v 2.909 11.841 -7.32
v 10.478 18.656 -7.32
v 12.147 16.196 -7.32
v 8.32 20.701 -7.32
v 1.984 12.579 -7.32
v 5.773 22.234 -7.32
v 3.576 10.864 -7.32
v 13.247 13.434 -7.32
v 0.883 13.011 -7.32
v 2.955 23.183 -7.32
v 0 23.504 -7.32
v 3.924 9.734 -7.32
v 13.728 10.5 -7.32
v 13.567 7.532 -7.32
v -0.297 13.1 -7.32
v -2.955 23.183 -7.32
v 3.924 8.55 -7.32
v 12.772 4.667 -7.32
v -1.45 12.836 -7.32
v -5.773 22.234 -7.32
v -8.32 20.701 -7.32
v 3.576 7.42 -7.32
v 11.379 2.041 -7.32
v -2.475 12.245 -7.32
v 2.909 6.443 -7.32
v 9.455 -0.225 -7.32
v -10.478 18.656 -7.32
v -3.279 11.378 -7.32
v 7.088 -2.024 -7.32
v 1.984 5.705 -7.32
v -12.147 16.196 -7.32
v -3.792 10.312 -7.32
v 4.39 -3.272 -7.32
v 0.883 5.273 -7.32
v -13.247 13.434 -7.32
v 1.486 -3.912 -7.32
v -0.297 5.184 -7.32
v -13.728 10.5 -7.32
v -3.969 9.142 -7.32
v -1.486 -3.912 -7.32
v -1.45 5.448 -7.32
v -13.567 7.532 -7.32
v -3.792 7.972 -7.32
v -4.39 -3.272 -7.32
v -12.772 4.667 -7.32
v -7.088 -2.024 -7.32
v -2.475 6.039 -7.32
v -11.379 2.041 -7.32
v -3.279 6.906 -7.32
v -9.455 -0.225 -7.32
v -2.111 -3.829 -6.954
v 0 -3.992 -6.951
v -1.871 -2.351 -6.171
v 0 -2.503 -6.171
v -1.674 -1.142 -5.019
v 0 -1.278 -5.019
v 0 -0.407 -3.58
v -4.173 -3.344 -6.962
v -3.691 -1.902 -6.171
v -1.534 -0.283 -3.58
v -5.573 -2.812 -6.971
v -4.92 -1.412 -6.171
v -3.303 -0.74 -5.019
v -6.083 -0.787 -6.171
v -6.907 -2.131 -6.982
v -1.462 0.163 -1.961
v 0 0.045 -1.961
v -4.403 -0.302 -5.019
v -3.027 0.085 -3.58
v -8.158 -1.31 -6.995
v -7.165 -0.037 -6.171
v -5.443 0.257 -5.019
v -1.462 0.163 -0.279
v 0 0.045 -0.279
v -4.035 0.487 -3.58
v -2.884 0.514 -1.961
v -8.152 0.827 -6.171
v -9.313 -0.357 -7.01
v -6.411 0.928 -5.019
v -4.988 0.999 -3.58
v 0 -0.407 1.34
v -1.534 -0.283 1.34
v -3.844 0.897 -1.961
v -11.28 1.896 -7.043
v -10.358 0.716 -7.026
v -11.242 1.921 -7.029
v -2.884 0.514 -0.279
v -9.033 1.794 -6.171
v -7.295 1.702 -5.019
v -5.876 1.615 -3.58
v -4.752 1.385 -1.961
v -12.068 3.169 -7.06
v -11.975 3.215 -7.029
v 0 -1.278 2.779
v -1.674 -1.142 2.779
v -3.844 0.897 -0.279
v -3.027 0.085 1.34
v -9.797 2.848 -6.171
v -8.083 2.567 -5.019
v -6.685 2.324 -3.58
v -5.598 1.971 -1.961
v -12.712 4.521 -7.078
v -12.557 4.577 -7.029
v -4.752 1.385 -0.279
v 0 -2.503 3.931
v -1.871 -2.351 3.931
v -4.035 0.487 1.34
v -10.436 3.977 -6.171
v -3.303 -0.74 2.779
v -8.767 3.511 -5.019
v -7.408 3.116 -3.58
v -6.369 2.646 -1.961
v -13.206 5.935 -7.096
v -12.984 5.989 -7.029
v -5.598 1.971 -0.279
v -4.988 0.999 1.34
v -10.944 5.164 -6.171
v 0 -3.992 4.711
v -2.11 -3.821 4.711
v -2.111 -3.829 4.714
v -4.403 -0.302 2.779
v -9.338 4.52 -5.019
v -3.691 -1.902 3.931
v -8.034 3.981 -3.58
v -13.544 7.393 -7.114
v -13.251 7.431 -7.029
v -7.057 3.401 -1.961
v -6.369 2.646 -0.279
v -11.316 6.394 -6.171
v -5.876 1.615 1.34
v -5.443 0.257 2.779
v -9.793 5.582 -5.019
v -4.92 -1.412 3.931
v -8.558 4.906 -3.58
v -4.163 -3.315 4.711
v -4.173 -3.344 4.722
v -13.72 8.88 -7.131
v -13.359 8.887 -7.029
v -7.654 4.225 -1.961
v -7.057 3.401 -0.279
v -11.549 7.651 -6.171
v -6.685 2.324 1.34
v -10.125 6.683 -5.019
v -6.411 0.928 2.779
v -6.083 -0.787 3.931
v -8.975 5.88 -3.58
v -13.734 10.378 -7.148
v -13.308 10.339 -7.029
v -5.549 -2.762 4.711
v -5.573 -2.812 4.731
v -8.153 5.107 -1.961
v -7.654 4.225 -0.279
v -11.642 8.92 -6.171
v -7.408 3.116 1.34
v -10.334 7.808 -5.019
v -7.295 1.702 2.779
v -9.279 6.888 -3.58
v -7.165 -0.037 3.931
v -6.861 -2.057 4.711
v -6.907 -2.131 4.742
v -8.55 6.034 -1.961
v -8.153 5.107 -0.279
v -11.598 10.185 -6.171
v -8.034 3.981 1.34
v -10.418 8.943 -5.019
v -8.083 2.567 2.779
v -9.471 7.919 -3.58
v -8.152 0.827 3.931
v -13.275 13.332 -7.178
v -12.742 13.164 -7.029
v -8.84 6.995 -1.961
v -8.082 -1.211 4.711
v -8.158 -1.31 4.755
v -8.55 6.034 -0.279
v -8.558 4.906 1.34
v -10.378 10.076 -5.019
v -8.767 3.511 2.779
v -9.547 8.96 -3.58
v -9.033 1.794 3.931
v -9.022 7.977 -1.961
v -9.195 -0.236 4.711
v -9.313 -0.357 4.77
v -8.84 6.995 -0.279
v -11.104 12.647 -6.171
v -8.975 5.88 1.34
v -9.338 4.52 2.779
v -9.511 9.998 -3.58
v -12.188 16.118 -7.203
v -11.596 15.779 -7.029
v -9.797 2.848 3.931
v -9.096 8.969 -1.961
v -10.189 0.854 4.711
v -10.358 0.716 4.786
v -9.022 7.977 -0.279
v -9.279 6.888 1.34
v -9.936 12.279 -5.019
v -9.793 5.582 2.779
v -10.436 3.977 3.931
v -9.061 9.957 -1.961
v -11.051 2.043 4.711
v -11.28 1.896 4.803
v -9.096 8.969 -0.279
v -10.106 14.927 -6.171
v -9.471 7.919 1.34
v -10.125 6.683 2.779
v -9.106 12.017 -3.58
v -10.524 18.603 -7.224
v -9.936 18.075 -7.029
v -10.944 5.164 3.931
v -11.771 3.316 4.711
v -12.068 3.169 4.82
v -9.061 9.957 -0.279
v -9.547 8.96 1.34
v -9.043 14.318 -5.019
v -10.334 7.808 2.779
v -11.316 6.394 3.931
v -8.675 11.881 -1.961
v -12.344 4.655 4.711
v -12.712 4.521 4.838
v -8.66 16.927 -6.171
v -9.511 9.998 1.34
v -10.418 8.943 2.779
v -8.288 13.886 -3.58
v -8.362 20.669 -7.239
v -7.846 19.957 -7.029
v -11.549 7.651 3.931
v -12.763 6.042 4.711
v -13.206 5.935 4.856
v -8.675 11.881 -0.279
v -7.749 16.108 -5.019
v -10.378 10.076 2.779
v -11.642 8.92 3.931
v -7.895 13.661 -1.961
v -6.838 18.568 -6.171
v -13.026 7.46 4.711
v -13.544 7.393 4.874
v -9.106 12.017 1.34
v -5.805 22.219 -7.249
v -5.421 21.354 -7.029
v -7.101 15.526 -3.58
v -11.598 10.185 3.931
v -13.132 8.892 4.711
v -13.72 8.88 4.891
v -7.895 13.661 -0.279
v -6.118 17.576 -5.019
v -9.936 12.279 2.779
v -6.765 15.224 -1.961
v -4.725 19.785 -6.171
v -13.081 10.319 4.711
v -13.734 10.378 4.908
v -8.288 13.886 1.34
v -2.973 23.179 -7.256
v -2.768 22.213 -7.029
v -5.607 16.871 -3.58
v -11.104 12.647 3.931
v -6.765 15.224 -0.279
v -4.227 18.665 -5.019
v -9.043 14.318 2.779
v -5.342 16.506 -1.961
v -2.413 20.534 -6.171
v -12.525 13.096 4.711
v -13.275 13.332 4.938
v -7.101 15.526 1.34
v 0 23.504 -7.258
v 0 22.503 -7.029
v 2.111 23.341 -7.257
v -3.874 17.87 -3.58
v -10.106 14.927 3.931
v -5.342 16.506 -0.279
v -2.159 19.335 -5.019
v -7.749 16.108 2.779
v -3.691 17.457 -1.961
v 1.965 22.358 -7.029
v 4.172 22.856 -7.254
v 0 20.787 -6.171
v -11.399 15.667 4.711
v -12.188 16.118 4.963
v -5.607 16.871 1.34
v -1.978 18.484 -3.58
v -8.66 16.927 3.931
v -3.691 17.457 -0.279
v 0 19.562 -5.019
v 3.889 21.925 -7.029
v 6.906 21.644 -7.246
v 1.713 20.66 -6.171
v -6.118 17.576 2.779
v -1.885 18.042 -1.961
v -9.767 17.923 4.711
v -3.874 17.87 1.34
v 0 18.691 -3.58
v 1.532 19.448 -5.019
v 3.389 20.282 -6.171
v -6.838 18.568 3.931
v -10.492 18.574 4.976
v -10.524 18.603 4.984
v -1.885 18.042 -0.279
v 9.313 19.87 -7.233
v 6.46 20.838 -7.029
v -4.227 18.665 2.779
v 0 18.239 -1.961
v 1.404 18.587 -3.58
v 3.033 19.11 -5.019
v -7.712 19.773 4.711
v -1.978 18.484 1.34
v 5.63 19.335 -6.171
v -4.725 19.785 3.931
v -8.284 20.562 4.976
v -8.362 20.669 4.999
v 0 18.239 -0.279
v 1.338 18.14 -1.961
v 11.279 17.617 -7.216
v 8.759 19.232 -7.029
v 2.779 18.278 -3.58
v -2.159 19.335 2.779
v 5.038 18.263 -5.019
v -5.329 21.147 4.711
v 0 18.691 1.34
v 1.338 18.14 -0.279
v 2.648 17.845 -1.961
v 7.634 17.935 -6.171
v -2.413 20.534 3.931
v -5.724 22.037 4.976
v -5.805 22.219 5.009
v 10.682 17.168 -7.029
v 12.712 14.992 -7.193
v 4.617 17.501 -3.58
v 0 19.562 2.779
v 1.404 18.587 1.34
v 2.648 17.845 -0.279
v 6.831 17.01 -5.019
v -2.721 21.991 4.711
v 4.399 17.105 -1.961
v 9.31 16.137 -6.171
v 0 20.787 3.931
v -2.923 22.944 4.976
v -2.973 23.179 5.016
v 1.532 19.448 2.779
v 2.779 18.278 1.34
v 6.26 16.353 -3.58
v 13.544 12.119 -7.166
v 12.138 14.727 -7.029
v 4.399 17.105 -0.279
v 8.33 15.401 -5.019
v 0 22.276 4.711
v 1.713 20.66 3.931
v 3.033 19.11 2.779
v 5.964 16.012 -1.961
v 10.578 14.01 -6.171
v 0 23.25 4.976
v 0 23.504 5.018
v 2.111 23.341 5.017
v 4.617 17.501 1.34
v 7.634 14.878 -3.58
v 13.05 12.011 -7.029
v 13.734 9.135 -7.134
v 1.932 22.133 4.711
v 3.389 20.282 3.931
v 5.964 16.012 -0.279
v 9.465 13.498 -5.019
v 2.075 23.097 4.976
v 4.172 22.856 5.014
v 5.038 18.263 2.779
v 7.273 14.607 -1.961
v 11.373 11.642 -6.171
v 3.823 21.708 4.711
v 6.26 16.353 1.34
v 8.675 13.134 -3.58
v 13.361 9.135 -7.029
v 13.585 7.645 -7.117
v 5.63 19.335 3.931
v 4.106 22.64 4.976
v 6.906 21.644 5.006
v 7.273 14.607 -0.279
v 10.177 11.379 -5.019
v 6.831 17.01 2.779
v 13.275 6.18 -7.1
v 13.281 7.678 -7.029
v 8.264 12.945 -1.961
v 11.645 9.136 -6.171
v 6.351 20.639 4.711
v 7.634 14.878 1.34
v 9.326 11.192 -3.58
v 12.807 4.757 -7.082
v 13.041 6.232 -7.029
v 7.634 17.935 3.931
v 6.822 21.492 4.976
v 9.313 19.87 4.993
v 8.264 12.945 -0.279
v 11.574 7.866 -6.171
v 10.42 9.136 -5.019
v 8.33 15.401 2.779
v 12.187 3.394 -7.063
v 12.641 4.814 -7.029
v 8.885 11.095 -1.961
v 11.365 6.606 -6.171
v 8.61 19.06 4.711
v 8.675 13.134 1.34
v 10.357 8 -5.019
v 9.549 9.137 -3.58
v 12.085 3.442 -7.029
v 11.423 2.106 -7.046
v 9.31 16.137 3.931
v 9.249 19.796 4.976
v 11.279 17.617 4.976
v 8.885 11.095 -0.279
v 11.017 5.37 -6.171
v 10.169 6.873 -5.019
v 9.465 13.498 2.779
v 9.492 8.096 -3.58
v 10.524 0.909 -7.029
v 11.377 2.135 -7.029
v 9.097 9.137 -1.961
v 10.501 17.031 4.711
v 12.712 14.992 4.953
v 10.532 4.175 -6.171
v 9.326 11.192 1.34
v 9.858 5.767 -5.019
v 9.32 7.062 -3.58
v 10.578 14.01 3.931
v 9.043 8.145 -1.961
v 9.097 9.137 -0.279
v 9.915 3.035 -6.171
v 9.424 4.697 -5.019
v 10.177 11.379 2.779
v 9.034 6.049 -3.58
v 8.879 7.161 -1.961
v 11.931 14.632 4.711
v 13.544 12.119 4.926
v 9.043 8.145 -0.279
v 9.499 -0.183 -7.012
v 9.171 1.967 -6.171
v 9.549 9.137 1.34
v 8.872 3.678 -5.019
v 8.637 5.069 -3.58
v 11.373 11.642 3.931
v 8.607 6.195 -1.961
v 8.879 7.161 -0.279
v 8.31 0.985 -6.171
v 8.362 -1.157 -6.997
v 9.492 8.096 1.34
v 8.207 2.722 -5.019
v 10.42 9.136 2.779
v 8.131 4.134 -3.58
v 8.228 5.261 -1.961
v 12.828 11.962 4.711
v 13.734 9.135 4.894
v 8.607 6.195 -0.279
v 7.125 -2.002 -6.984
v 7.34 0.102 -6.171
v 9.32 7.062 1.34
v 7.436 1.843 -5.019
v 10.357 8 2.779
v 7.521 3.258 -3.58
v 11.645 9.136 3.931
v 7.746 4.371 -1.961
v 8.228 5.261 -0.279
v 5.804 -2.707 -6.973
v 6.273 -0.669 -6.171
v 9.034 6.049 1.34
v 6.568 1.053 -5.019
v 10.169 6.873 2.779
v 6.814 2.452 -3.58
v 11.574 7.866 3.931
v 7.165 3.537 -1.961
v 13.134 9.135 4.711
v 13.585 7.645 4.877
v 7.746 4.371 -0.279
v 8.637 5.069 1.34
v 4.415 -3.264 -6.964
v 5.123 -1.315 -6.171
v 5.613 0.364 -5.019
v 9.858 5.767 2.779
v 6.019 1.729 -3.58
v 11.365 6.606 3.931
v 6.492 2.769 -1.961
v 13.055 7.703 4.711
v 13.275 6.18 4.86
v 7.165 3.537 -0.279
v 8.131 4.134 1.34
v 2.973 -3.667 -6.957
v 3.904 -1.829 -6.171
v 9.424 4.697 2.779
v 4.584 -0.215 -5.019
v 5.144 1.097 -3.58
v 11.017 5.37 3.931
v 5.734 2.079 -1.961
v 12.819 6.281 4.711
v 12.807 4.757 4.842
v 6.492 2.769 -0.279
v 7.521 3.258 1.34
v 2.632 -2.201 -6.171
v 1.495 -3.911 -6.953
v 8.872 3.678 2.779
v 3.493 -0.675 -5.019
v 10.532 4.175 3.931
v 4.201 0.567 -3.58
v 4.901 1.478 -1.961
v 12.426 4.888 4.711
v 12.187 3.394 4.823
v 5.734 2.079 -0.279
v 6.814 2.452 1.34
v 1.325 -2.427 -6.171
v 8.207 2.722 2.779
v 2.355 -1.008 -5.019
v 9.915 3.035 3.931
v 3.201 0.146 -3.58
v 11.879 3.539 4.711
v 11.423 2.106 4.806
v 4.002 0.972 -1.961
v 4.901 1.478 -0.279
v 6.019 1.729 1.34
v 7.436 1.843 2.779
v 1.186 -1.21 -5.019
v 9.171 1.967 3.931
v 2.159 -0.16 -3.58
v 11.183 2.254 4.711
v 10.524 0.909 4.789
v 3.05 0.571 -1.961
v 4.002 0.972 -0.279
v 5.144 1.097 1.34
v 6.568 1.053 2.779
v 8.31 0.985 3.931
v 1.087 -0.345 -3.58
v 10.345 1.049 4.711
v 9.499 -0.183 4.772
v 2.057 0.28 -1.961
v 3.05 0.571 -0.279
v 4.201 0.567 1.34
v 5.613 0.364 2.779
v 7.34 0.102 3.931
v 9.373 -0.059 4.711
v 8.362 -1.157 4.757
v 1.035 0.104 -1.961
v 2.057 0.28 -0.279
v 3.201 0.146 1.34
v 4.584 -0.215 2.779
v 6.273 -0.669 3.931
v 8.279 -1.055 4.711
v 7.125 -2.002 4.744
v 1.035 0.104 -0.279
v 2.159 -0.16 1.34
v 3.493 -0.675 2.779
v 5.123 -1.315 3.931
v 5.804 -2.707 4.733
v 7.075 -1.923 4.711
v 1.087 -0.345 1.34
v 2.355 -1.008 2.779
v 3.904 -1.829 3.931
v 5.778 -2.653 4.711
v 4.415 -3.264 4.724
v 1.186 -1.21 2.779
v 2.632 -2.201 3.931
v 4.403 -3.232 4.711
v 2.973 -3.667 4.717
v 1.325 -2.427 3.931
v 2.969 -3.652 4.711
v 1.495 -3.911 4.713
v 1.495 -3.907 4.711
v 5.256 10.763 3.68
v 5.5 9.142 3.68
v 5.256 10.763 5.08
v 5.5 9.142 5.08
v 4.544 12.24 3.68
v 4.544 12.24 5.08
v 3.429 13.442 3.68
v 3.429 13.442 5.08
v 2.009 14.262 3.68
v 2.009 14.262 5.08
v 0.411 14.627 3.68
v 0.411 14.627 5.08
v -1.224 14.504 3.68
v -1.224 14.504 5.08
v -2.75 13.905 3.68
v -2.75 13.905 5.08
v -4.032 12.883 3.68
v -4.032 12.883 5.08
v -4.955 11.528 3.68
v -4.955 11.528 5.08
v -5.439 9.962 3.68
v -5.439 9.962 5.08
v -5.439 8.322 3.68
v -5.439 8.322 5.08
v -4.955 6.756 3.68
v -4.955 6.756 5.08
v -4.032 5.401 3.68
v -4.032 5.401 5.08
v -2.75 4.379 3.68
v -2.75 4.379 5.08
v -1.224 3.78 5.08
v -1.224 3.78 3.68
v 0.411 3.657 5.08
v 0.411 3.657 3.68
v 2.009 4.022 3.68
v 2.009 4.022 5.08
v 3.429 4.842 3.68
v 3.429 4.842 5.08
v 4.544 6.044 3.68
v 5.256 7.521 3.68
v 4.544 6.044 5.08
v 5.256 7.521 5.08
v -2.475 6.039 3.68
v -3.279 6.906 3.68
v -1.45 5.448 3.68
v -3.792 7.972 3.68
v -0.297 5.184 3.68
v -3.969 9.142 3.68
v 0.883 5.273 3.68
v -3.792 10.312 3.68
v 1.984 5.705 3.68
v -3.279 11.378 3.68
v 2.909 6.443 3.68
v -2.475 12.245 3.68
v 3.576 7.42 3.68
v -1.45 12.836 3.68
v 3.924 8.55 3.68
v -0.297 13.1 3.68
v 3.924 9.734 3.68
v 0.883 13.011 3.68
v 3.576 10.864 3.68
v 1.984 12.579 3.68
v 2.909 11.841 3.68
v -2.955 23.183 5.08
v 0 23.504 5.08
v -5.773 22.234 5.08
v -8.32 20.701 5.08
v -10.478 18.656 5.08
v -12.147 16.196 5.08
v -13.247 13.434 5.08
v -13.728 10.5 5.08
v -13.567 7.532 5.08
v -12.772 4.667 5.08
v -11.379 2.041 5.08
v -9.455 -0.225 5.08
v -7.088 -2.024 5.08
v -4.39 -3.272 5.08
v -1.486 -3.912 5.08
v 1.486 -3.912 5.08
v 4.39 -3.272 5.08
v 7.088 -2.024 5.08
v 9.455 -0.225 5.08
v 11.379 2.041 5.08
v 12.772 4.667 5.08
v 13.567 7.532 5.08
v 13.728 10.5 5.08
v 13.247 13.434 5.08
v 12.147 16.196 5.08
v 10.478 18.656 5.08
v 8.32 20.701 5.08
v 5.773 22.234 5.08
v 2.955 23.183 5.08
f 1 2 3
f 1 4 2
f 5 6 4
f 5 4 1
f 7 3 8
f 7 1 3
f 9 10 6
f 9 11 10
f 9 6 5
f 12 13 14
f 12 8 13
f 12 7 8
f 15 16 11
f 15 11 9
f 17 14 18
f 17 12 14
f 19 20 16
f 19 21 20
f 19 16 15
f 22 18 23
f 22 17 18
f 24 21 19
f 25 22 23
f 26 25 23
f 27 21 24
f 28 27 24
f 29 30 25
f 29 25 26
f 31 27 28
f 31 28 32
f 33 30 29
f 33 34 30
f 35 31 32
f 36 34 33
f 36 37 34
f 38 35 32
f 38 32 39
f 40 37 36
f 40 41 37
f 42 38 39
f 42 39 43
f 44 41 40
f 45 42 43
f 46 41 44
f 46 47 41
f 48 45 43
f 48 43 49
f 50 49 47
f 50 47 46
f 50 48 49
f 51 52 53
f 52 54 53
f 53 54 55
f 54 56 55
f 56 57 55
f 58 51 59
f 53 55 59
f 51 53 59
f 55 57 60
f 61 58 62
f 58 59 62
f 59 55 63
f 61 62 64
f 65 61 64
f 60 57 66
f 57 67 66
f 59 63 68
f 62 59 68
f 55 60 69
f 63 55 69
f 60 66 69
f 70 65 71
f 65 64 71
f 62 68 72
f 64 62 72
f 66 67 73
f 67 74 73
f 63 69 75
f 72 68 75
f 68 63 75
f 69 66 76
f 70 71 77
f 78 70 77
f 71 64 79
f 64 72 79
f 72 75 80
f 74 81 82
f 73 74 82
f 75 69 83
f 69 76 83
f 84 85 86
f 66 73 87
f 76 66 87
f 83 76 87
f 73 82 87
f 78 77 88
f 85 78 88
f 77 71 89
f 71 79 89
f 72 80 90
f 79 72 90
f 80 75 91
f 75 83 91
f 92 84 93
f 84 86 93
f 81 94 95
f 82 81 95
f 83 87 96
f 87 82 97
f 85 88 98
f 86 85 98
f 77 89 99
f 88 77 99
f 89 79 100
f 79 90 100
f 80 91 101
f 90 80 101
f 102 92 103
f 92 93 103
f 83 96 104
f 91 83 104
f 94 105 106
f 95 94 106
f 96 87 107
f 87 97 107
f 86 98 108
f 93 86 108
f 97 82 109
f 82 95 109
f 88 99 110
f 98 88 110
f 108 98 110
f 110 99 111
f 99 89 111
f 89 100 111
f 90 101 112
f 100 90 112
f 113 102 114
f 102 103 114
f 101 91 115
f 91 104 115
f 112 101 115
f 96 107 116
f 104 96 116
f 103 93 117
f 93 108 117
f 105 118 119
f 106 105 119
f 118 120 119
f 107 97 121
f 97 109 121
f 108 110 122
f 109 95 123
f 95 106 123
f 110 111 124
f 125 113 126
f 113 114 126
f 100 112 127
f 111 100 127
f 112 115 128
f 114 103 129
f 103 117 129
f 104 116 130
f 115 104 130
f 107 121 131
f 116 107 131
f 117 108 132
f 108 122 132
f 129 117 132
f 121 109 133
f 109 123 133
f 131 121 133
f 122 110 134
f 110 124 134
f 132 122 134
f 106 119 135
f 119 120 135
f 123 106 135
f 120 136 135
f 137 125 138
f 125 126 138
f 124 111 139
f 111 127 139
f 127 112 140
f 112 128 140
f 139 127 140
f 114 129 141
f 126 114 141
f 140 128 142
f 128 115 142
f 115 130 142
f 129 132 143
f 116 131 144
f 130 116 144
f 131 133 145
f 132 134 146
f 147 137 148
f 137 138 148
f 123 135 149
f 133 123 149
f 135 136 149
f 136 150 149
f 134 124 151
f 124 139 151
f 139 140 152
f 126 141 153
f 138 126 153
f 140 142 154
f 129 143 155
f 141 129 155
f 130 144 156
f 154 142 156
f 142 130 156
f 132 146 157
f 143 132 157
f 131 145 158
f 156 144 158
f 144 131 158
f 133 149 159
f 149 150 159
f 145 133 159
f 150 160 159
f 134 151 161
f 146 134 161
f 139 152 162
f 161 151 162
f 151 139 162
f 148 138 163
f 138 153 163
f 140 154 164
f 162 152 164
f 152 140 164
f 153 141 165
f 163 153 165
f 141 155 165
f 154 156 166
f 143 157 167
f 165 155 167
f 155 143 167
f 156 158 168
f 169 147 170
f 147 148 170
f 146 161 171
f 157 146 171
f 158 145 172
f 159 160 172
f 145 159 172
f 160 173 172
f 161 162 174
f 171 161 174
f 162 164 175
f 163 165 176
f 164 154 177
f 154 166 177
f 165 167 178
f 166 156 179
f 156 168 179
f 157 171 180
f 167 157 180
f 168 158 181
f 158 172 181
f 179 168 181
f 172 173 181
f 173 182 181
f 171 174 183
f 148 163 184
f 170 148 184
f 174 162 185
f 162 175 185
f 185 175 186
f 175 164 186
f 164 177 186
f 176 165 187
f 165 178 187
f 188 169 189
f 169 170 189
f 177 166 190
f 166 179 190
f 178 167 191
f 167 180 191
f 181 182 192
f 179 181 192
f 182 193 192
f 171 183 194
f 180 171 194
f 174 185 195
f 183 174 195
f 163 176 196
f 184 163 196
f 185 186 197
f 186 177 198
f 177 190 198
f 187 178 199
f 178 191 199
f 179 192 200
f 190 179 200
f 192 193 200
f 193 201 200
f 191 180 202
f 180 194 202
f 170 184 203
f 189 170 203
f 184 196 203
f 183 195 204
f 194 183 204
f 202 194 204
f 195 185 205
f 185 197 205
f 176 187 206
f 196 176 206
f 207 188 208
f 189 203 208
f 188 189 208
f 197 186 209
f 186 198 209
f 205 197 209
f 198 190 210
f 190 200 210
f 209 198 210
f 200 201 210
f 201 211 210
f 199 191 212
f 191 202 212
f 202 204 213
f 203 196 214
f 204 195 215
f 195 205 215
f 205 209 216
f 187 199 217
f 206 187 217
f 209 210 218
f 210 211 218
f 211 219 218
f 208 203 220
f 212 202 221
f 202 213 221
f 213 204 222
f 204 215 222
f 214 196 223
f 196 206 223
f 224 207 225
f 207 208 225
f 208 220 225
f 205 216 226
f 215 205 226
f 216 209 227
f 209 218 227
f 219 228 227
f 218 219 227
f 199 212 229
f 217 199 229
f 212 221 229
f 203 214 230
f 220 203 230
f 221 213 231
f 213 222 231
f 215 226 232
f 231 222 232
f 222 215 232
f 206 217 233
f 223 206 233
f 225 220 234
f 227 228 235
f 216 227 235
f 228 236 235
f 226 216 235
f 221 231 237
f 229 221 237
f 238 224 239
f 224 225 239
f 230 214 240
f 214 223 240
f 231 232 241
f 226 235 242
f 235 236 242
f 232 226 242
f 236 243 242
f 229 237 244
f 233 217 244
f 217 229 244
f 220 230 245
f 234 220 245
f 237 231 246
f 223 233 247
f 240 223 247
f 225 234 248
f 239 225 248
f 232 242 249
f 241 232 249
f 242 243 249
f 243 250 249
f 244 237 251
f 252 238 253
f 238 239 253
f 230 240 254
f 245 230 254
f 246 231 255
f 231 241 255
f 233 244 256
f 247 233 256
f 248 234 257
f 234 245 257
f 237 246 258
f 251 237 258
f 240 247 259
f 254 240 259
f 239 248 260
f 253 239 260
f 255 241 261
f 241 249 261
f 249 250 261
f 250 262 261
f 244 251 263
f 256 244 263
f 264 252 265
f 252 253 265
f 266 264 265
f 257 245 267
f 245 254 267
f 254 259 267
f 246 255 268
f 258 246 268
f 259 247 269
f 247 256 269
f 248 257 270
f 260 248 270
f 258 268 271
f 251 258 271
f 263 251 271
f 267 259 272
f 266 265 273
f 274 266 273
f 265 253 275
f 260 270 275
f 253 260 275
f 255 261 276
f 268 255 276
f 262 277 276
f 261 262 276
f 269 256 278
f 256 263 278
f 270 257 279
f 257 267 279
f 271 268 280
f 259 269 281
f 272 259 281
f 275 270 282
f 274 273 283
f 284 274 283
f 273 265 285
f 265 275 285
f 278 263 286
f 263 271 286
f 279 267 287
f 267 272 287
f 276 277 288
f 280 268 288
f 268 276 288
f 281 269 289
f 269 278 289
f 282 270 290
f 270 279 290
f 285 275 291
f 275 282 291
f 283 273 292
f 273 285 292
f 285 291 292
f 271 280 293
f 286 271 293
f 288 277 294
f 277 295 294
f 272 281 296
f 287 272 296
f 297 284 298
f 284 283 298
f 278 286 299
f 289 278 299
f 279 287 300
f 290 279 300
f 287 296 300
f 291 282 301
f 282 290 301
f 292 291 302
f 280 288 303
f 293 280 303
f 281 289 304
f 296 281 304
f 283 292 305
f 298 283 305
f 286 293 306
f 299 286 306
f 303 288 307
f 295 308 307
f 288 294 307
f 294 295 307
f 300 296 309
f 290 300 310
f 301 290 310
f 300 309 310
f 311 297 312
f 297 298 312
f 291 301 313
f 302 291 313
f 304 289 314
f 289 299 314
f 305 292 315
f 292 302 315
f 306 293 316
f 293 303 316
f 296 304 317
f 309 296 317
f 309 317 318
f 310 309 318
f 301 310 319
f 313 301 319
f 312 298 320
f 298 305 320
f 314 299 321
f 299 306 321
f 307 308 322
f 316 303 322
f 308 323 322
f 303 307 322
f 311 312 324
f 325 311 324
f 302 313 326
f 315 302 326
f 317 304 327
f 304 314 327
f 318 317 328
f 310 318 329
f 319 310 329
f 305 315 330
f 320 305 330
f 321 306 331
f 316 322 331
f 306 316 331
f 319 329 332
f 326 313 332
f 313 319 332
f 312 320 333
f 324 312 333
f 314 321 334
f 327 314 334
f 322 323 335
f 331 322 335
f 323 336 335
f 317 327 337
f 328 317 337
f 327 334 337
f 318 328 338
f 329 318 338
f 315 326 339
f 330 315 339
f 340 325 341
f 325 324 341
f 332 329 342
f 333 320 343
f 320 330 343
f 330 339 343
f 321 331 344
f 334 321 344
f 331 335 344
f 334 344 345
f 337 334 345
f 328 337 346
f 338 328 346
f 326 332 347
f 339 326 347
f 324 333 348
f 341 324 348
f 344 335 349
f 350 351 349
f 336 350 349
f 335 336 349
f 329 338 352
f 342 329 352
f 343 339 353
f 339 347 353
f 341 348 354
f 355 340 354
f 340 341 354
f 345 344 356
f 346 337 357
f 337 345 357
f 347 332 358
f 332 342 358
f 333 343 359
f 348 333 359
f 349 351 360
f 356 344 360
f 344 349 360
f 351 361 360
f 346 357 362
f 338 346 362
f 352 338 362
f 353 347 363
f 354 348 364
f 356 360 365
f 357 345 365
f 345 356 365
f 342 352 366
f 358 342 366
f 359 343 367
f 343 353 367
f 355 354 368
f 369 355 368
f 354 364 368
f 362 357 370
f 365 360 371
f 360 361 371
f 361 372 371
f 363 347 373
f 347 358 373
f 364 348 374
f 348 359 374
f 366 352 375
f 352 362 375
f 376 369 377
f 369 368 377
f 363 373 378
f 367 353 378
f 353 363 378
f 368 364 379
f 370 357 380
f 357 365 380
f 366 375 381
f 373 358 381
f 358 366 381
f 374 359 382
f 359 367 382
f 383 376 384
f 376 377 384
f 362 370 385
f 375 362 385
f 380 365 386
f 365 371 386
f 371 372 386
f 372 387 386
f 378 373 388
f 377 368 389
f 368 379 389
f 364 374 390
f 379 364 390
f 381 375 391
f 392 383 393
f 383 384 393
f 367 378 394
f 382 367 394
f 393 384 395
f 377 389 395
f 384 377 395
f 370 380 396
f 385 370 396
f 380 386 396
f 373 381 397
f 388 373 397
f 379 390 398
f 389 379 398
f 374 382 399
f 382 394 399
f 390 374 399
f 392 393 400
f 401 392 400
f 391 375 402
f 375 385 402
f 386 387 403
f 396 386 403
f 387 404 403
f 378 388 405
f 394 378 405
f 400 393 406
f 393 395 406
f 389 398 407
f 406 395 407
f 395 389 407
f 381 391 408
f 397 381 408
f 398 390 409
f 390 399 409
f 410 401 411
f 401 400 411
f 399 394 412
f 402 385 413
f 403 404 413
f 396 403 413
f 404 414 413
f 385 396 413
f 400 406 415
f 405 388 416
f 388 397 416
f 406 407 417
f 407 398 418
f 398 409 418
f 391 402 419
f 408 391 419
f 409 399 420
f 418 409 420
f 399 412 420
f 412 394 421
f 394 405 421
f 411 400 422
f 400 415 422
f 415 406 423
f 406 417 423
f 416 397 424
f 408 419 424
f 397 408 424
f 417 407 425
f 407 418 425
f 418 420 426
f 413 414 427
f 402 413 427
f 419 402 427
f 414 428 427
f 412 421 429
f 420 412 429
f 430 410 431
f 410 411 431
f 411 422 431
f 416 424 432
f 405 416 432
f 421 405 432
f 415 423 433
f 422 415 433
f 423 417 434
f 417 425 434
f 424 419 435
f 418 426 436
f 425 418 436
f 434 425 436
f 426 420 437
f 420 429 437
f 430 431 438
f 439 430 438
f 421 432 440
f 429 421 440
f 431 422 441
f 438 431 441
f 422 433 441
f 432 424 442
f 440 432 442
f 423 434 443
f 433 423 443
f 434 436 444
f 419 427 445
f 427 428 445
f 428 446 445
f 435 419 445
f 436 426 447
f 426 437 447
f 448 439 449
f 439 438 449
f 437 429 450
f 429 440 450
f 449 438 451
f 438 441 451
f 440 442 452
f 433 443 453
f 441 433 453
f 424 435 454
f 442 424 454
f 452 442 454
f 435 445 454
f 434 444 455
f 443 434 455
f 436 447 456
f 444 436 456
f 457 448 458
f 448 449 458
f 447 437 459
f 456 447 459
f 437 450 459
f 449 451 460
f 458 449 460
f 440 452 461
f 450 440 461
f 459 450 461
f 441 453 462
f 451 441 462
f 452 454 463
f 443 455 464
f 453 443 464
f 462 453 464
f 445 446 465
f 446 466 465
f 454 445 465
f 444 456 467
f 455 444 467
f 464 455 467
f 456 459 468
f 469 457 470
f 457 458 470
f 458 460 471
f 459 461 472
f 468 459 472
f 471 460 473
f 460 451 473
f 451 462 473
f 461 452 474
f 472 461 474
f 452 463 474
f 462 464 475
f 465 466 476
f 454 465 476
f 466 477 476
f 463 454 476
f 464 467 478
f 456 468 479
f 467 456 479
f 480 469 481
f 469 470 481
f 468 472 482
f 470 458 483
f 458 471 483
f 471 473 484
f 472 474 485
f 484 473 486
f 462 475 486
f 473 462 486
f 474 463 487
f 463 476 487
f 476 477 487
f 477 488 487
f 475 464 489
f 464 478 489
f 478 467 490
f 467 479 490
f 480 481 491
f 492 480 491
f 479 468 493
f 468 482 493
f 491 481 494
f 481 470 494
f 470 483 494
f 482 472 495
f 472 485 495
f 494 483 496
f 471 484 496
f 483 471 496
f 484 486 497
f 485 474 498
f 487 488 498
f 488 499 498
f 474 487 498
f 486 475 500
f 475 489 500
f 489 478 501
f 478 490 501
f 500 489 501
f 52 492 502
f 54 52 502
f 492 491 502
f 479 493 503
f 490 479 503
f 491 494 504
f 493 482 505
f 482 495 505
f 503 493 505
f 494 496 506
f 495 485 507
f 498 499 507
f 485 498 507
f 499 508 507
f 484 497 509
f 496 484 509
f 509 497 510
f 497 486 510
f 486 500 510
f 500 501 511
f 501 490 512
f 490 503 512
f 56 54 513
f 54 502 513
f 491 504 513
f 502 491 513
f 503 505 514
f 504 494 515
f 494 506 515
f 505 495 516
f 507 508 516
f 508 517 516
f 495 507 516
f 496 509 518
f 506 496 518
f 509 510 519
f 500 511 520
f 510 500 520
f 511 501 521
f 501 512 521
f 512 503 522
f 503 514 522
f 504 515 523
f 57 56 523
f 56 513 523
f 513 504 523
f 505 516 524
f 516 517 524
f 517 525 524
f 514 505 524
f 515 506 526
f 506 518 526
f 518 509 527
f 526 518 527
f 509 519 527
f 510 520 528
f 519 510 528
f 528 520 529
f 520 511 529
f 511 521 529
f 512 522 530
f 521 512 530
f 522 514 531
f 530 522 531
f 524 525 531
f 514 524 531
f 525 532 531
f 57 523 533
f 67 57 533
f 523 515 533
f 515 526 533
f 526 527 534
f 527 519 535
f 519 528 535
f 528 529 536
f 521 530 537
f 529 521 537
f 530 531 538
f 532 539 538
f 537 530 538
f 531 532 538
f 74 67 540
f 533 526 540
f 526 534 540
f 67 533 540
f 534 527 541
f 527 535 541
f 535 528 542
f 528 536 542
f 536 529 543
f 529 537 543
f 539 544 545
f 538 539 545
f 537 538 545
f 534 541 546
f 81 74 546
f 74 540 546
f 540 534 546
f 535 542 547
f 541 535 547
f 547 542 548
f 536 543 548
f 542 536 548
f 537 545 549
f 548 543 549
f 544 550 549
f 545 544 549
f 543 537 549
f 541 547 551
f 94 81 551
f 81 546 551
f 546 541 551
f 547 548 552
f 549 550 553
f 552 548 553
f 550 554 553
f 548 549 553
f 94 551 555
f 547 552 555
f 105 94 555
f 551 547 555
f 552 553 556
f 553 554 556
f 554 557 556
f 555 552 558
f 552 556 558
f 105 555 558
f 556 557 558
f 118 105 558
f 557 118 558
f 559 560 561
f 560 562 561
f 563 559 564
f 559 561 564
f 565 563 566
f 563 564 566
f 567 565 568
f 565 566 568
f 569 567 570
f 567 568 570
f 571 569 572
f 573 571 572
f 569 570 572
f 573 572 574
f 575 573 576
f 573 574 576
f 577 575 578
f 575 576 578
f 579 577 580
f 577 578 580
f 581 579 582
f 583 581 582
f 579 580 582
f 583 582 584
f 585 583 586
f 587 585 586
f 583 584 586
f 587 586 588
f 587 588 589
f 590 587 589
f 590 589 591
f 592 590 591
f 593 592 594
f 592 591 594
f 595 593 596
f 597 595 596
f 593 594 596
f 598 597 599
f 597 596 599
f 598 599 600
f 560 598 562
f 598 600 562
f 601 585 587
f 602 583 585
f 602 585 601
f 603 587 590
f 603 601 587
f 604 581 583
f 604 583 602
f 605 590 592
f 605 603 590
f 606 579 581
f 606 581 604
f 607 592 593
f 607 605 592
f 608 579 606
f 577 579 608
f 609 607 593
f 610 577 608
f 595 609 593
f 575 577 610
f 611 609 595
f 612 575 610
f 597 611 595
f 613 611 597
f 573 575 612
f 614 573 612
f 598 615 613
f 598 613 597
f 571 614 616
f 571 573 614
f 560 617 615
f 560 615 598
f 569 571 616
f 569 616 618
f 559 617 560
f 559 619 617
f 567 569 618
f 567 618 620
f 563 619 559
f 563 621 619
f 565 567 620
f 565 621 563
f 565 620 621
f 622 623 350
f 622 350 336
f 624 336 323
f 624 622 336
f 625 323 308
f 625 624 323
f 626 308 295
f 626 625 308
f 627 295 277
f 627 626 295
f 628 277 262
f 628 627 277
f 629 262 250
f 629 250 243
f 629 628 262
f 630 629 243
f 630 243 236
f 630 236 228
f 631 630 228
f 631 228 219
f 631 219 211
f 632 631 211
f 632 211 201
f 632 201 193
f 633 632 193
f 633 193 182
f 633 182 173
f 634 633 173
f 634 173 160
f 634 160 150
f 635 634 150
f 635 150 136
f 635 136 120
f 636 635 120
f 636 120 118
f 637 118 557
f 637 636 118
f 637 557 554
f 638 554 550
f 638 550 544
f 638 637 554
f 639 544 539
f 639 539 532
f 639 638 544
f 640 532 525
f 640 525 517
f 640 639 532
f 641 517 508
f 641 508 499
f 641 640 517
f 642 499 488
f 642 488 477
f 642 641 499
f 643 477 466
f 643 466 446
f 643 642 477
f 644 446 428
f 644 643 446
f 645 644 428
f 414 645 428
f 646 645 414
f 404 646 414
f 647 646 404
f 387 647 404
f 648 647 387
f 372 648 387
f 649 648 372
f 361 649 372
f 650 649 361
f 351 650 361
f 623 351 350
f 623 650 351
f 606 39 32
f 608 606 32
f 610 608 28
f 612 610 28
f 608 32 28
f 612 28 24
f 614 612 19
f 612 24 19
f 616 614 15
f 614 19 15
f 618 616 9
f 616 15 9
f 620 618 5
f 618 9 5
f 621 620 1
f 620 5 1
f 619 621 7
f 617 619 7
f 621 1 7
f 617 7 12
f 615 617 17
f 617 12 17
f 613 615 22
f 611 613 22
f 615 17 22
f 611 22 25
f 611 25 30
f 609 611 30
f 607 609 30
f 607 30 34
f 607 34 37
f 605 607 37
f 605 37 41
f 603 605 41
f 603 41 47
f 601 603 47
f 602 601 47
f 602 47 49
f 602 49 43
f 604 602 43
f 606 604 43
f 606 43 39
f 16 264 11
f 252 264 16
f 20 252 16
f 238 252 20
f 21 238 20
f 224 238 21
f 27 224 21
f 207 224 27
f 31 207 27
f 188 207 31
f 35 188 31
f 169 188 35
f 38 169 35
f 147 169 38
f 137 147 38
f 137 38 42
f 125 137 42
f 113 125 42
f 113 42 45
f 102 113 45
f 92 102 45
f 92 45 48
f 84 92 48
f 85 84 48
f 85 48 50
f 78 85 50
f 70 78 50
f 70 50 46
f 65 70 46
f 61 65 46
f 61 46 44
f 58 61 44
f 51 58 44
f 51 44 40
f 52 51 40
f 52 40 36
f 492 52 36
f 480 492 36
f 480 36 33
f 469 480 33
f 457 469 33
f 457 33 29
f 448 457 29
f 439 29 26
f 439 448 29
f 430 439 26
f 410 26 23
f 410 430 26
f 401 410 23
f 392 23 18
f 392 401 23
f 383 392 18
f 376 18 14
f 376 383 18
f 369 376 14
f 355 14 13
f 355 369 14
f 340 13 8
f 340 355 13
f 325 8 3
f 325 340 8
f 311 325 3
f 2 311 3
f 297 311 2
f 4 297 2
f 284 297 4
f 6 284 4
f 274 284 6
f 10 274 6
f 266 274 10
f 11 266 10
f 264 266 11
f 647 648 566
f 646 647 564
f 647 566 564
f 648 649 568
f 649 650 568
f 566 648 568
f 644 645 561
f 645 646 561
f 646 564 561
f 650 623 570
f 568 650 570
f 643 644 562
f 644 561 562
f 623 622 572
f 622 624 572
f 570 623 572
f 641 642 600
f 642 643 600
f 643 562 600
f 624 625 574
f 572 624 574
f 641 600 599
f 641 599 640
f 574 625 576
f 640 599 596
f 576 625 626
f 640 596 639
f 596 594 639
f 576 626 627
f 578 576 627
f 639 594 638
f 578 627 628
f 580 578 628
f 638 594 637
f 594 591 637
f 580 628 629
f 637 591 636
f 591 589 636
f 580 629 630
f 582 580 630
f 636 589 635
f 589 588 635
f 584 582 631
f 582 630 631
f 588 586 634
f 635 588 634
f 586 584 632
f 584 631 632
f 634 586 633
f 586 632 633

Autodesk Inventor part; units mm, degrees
ref_plane "YZ Plane" through (0, 0, 0) normal (1, 0, 0) x (0, 1, 0)
ref_plane "XZ Plane" through (0, 0, 0) normal (0, 1, 0) x (-1, 0, 0)
ref_plane "XY Plane" through (0, 0, 0) normal (0, 0, 1) x (1, 0, 0)
sketch "Sketch1" plane through (0, 0, 0) normal (1, 0, 0) x (0, 1, 0)
  line L0 (-6.098, -7.32) -> (9.142, -7.32)
  line L1 (9.142, 5.08) -> (-6.098, 5.08)
  line L2 (9.142, 6.8113) -> (9.142, -7.738)
  arc A0 (-6.098, -7.32) -> (-6.098, 5.08) centre (-6.098, -1.12) ccw
  point P0 (0, 0)
  dimension "d4" = 12.4
  dimension "d5" = 15.24
revolve "Revolution1" add sketch "Sketch1" angle 360 about axis through (0, 9.142, 6.8113) along (0, 0, -1)
sketch "Sketch2" plane through (0, 9.142, -7.32) normal (0, 0, -1) x (-1, 0, 0)
  circle A0 centre (0, 0) radius 15.24 projected
  circle A1 centre (0, 0) radius 3.9688
  dimension "d1" = 7.9375
extrude "Extrusion1" cut sketch "Sketch2" against normal through all contours A1
sketch "Sketch4" plane through (0, 0, 0) normal (1, 0, 0) x (0, 1, 0)
  line L0 (23.5043, 7.0392) -> (26.3008, 7.0392)
  line L1 (26.3008, 7.0392) -> (26.3008, -7.7625)
  line L2 (26.3008, -7.7625) -> (23.5043, -7.7625)
  line L3 (23.5043, -7.7625) -> (23.5043, 7.0392)
  line L4 (9.7561, -8.4) -> (9.7561, 8.96)
  point P0 (0, 0)
revolve "Revolution2" cut sketch "Sketch4" angle 360 about axis through (0, 9.7561, -8.4) along (0, 0, 1)
sketch "Sketch5" plane through (0, 9.7561, 5.08) normal (0, 0, 1) x (1, 0, 0)
  circle A0 centre (0, -0.6141) radius 5.5 projected
  point P0 (0, -9.7561)
extrude "Extrusion3" cut sketch "Sketch5" against normal blind 1.4
properties part number "surgicalpulley"
